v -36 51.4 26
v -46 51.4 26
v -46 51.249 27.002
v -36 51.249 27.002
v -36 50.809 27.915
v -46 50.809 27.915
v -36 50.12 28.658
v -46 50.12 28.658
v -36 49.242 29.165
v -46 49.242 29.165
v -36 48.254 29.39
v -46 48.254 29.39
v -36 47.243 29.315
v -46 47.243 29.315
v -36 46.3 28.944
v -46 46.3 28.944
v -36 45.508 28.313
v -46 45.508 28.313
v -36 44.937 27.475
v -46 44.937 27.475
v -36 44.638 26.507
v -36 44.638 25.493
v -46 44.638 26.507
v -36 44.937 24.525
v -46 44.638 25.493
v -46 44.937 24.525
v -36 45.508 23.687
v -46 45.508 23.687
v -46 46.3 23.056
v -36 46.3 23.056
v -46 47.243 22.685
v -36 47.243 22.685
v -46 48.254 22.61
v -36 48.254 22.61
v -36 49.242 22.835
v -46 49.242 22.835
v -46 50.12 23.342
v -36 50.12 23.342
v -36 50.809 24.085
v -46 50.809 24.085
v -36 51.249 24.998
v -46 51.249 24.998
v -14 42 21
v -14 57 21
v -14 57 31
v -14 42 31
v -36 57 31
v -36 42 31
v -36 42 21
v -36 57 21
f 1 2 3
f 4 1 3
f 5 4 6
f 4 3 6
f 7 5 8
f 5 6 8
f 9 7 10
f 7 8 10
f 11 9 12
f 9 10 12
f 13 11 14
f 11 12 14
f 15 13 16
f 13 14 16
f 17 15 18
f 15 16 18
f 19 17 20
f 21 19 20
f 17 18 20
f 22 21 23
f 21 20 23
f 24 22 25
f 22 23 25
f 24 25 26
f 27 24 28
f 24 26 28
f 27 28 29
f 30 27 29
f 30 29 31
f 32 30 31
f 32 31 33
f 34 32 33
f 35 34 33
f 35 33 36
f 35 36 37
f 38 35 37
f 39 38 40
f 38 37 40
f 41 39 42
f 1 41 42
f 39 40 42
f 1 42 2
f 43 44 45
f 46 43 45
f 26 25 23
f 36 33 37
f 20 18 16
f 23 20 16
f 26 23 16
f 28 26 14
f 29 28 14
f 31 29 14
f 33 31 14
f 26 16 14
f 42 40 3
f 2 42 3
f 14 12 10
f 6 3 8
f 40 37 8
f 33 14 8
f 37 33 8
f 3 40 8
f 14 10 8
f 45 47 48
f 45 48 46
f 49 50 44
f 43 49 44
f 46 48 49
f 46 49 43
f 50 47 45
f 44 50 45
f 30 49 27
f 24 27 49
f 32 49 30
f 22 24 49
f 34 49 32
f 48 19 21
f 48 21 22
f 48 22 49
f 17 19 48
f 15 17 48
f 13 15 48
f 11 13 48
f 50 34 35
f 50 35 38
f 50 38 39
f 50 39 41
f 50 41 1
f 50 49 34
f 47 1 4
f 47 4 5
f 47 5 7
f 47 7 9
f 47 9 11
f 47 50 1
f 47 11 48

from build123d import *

# Parameters (mm, degrees)
CYLINDER_R                   = 3.4
CYLINDER_DEPTH               = 10
BOX003_W                     = 22
BOX003_H                     = 10
BOX003_DEPTH                 = 15
FUSION002004_PLACEMENT_ANGLE = 90


with BuildPart() as cylinder:
    # Cylinder → Cylinder (new body)
    with BuildSketch(Plane(origin=(-10, 5, 9), x_dir=(0, 0, -1), z_dir=(1, 0, 0))):
        Circle(CYLINDER_R)
    extrude(amount=CYLINDER_DEPTH)


with BuildPart() as potentiometer:
    # Box003 → Box003 (new body)
    with BuildSketch(Plane.XY):
        with Locations((11, 5)):
            Rectangle(BOX003_W, BOX003_H)
    extrude(amount=BOX003_DEPTH)

    # Fusion002004: union Cylinder
    add(cylinder.part)


with BuildPart() as potentiometer_1:
    # Fusion002004 placement: moved
    add(potentiometer.part.moved(Location((-36, 57, 21))).rotate(Axis((-36, 57, 21), (1, 0, 0)), FUSION002004_PLACEMENT_ANGLE))


solid = potentiometer_1.part
